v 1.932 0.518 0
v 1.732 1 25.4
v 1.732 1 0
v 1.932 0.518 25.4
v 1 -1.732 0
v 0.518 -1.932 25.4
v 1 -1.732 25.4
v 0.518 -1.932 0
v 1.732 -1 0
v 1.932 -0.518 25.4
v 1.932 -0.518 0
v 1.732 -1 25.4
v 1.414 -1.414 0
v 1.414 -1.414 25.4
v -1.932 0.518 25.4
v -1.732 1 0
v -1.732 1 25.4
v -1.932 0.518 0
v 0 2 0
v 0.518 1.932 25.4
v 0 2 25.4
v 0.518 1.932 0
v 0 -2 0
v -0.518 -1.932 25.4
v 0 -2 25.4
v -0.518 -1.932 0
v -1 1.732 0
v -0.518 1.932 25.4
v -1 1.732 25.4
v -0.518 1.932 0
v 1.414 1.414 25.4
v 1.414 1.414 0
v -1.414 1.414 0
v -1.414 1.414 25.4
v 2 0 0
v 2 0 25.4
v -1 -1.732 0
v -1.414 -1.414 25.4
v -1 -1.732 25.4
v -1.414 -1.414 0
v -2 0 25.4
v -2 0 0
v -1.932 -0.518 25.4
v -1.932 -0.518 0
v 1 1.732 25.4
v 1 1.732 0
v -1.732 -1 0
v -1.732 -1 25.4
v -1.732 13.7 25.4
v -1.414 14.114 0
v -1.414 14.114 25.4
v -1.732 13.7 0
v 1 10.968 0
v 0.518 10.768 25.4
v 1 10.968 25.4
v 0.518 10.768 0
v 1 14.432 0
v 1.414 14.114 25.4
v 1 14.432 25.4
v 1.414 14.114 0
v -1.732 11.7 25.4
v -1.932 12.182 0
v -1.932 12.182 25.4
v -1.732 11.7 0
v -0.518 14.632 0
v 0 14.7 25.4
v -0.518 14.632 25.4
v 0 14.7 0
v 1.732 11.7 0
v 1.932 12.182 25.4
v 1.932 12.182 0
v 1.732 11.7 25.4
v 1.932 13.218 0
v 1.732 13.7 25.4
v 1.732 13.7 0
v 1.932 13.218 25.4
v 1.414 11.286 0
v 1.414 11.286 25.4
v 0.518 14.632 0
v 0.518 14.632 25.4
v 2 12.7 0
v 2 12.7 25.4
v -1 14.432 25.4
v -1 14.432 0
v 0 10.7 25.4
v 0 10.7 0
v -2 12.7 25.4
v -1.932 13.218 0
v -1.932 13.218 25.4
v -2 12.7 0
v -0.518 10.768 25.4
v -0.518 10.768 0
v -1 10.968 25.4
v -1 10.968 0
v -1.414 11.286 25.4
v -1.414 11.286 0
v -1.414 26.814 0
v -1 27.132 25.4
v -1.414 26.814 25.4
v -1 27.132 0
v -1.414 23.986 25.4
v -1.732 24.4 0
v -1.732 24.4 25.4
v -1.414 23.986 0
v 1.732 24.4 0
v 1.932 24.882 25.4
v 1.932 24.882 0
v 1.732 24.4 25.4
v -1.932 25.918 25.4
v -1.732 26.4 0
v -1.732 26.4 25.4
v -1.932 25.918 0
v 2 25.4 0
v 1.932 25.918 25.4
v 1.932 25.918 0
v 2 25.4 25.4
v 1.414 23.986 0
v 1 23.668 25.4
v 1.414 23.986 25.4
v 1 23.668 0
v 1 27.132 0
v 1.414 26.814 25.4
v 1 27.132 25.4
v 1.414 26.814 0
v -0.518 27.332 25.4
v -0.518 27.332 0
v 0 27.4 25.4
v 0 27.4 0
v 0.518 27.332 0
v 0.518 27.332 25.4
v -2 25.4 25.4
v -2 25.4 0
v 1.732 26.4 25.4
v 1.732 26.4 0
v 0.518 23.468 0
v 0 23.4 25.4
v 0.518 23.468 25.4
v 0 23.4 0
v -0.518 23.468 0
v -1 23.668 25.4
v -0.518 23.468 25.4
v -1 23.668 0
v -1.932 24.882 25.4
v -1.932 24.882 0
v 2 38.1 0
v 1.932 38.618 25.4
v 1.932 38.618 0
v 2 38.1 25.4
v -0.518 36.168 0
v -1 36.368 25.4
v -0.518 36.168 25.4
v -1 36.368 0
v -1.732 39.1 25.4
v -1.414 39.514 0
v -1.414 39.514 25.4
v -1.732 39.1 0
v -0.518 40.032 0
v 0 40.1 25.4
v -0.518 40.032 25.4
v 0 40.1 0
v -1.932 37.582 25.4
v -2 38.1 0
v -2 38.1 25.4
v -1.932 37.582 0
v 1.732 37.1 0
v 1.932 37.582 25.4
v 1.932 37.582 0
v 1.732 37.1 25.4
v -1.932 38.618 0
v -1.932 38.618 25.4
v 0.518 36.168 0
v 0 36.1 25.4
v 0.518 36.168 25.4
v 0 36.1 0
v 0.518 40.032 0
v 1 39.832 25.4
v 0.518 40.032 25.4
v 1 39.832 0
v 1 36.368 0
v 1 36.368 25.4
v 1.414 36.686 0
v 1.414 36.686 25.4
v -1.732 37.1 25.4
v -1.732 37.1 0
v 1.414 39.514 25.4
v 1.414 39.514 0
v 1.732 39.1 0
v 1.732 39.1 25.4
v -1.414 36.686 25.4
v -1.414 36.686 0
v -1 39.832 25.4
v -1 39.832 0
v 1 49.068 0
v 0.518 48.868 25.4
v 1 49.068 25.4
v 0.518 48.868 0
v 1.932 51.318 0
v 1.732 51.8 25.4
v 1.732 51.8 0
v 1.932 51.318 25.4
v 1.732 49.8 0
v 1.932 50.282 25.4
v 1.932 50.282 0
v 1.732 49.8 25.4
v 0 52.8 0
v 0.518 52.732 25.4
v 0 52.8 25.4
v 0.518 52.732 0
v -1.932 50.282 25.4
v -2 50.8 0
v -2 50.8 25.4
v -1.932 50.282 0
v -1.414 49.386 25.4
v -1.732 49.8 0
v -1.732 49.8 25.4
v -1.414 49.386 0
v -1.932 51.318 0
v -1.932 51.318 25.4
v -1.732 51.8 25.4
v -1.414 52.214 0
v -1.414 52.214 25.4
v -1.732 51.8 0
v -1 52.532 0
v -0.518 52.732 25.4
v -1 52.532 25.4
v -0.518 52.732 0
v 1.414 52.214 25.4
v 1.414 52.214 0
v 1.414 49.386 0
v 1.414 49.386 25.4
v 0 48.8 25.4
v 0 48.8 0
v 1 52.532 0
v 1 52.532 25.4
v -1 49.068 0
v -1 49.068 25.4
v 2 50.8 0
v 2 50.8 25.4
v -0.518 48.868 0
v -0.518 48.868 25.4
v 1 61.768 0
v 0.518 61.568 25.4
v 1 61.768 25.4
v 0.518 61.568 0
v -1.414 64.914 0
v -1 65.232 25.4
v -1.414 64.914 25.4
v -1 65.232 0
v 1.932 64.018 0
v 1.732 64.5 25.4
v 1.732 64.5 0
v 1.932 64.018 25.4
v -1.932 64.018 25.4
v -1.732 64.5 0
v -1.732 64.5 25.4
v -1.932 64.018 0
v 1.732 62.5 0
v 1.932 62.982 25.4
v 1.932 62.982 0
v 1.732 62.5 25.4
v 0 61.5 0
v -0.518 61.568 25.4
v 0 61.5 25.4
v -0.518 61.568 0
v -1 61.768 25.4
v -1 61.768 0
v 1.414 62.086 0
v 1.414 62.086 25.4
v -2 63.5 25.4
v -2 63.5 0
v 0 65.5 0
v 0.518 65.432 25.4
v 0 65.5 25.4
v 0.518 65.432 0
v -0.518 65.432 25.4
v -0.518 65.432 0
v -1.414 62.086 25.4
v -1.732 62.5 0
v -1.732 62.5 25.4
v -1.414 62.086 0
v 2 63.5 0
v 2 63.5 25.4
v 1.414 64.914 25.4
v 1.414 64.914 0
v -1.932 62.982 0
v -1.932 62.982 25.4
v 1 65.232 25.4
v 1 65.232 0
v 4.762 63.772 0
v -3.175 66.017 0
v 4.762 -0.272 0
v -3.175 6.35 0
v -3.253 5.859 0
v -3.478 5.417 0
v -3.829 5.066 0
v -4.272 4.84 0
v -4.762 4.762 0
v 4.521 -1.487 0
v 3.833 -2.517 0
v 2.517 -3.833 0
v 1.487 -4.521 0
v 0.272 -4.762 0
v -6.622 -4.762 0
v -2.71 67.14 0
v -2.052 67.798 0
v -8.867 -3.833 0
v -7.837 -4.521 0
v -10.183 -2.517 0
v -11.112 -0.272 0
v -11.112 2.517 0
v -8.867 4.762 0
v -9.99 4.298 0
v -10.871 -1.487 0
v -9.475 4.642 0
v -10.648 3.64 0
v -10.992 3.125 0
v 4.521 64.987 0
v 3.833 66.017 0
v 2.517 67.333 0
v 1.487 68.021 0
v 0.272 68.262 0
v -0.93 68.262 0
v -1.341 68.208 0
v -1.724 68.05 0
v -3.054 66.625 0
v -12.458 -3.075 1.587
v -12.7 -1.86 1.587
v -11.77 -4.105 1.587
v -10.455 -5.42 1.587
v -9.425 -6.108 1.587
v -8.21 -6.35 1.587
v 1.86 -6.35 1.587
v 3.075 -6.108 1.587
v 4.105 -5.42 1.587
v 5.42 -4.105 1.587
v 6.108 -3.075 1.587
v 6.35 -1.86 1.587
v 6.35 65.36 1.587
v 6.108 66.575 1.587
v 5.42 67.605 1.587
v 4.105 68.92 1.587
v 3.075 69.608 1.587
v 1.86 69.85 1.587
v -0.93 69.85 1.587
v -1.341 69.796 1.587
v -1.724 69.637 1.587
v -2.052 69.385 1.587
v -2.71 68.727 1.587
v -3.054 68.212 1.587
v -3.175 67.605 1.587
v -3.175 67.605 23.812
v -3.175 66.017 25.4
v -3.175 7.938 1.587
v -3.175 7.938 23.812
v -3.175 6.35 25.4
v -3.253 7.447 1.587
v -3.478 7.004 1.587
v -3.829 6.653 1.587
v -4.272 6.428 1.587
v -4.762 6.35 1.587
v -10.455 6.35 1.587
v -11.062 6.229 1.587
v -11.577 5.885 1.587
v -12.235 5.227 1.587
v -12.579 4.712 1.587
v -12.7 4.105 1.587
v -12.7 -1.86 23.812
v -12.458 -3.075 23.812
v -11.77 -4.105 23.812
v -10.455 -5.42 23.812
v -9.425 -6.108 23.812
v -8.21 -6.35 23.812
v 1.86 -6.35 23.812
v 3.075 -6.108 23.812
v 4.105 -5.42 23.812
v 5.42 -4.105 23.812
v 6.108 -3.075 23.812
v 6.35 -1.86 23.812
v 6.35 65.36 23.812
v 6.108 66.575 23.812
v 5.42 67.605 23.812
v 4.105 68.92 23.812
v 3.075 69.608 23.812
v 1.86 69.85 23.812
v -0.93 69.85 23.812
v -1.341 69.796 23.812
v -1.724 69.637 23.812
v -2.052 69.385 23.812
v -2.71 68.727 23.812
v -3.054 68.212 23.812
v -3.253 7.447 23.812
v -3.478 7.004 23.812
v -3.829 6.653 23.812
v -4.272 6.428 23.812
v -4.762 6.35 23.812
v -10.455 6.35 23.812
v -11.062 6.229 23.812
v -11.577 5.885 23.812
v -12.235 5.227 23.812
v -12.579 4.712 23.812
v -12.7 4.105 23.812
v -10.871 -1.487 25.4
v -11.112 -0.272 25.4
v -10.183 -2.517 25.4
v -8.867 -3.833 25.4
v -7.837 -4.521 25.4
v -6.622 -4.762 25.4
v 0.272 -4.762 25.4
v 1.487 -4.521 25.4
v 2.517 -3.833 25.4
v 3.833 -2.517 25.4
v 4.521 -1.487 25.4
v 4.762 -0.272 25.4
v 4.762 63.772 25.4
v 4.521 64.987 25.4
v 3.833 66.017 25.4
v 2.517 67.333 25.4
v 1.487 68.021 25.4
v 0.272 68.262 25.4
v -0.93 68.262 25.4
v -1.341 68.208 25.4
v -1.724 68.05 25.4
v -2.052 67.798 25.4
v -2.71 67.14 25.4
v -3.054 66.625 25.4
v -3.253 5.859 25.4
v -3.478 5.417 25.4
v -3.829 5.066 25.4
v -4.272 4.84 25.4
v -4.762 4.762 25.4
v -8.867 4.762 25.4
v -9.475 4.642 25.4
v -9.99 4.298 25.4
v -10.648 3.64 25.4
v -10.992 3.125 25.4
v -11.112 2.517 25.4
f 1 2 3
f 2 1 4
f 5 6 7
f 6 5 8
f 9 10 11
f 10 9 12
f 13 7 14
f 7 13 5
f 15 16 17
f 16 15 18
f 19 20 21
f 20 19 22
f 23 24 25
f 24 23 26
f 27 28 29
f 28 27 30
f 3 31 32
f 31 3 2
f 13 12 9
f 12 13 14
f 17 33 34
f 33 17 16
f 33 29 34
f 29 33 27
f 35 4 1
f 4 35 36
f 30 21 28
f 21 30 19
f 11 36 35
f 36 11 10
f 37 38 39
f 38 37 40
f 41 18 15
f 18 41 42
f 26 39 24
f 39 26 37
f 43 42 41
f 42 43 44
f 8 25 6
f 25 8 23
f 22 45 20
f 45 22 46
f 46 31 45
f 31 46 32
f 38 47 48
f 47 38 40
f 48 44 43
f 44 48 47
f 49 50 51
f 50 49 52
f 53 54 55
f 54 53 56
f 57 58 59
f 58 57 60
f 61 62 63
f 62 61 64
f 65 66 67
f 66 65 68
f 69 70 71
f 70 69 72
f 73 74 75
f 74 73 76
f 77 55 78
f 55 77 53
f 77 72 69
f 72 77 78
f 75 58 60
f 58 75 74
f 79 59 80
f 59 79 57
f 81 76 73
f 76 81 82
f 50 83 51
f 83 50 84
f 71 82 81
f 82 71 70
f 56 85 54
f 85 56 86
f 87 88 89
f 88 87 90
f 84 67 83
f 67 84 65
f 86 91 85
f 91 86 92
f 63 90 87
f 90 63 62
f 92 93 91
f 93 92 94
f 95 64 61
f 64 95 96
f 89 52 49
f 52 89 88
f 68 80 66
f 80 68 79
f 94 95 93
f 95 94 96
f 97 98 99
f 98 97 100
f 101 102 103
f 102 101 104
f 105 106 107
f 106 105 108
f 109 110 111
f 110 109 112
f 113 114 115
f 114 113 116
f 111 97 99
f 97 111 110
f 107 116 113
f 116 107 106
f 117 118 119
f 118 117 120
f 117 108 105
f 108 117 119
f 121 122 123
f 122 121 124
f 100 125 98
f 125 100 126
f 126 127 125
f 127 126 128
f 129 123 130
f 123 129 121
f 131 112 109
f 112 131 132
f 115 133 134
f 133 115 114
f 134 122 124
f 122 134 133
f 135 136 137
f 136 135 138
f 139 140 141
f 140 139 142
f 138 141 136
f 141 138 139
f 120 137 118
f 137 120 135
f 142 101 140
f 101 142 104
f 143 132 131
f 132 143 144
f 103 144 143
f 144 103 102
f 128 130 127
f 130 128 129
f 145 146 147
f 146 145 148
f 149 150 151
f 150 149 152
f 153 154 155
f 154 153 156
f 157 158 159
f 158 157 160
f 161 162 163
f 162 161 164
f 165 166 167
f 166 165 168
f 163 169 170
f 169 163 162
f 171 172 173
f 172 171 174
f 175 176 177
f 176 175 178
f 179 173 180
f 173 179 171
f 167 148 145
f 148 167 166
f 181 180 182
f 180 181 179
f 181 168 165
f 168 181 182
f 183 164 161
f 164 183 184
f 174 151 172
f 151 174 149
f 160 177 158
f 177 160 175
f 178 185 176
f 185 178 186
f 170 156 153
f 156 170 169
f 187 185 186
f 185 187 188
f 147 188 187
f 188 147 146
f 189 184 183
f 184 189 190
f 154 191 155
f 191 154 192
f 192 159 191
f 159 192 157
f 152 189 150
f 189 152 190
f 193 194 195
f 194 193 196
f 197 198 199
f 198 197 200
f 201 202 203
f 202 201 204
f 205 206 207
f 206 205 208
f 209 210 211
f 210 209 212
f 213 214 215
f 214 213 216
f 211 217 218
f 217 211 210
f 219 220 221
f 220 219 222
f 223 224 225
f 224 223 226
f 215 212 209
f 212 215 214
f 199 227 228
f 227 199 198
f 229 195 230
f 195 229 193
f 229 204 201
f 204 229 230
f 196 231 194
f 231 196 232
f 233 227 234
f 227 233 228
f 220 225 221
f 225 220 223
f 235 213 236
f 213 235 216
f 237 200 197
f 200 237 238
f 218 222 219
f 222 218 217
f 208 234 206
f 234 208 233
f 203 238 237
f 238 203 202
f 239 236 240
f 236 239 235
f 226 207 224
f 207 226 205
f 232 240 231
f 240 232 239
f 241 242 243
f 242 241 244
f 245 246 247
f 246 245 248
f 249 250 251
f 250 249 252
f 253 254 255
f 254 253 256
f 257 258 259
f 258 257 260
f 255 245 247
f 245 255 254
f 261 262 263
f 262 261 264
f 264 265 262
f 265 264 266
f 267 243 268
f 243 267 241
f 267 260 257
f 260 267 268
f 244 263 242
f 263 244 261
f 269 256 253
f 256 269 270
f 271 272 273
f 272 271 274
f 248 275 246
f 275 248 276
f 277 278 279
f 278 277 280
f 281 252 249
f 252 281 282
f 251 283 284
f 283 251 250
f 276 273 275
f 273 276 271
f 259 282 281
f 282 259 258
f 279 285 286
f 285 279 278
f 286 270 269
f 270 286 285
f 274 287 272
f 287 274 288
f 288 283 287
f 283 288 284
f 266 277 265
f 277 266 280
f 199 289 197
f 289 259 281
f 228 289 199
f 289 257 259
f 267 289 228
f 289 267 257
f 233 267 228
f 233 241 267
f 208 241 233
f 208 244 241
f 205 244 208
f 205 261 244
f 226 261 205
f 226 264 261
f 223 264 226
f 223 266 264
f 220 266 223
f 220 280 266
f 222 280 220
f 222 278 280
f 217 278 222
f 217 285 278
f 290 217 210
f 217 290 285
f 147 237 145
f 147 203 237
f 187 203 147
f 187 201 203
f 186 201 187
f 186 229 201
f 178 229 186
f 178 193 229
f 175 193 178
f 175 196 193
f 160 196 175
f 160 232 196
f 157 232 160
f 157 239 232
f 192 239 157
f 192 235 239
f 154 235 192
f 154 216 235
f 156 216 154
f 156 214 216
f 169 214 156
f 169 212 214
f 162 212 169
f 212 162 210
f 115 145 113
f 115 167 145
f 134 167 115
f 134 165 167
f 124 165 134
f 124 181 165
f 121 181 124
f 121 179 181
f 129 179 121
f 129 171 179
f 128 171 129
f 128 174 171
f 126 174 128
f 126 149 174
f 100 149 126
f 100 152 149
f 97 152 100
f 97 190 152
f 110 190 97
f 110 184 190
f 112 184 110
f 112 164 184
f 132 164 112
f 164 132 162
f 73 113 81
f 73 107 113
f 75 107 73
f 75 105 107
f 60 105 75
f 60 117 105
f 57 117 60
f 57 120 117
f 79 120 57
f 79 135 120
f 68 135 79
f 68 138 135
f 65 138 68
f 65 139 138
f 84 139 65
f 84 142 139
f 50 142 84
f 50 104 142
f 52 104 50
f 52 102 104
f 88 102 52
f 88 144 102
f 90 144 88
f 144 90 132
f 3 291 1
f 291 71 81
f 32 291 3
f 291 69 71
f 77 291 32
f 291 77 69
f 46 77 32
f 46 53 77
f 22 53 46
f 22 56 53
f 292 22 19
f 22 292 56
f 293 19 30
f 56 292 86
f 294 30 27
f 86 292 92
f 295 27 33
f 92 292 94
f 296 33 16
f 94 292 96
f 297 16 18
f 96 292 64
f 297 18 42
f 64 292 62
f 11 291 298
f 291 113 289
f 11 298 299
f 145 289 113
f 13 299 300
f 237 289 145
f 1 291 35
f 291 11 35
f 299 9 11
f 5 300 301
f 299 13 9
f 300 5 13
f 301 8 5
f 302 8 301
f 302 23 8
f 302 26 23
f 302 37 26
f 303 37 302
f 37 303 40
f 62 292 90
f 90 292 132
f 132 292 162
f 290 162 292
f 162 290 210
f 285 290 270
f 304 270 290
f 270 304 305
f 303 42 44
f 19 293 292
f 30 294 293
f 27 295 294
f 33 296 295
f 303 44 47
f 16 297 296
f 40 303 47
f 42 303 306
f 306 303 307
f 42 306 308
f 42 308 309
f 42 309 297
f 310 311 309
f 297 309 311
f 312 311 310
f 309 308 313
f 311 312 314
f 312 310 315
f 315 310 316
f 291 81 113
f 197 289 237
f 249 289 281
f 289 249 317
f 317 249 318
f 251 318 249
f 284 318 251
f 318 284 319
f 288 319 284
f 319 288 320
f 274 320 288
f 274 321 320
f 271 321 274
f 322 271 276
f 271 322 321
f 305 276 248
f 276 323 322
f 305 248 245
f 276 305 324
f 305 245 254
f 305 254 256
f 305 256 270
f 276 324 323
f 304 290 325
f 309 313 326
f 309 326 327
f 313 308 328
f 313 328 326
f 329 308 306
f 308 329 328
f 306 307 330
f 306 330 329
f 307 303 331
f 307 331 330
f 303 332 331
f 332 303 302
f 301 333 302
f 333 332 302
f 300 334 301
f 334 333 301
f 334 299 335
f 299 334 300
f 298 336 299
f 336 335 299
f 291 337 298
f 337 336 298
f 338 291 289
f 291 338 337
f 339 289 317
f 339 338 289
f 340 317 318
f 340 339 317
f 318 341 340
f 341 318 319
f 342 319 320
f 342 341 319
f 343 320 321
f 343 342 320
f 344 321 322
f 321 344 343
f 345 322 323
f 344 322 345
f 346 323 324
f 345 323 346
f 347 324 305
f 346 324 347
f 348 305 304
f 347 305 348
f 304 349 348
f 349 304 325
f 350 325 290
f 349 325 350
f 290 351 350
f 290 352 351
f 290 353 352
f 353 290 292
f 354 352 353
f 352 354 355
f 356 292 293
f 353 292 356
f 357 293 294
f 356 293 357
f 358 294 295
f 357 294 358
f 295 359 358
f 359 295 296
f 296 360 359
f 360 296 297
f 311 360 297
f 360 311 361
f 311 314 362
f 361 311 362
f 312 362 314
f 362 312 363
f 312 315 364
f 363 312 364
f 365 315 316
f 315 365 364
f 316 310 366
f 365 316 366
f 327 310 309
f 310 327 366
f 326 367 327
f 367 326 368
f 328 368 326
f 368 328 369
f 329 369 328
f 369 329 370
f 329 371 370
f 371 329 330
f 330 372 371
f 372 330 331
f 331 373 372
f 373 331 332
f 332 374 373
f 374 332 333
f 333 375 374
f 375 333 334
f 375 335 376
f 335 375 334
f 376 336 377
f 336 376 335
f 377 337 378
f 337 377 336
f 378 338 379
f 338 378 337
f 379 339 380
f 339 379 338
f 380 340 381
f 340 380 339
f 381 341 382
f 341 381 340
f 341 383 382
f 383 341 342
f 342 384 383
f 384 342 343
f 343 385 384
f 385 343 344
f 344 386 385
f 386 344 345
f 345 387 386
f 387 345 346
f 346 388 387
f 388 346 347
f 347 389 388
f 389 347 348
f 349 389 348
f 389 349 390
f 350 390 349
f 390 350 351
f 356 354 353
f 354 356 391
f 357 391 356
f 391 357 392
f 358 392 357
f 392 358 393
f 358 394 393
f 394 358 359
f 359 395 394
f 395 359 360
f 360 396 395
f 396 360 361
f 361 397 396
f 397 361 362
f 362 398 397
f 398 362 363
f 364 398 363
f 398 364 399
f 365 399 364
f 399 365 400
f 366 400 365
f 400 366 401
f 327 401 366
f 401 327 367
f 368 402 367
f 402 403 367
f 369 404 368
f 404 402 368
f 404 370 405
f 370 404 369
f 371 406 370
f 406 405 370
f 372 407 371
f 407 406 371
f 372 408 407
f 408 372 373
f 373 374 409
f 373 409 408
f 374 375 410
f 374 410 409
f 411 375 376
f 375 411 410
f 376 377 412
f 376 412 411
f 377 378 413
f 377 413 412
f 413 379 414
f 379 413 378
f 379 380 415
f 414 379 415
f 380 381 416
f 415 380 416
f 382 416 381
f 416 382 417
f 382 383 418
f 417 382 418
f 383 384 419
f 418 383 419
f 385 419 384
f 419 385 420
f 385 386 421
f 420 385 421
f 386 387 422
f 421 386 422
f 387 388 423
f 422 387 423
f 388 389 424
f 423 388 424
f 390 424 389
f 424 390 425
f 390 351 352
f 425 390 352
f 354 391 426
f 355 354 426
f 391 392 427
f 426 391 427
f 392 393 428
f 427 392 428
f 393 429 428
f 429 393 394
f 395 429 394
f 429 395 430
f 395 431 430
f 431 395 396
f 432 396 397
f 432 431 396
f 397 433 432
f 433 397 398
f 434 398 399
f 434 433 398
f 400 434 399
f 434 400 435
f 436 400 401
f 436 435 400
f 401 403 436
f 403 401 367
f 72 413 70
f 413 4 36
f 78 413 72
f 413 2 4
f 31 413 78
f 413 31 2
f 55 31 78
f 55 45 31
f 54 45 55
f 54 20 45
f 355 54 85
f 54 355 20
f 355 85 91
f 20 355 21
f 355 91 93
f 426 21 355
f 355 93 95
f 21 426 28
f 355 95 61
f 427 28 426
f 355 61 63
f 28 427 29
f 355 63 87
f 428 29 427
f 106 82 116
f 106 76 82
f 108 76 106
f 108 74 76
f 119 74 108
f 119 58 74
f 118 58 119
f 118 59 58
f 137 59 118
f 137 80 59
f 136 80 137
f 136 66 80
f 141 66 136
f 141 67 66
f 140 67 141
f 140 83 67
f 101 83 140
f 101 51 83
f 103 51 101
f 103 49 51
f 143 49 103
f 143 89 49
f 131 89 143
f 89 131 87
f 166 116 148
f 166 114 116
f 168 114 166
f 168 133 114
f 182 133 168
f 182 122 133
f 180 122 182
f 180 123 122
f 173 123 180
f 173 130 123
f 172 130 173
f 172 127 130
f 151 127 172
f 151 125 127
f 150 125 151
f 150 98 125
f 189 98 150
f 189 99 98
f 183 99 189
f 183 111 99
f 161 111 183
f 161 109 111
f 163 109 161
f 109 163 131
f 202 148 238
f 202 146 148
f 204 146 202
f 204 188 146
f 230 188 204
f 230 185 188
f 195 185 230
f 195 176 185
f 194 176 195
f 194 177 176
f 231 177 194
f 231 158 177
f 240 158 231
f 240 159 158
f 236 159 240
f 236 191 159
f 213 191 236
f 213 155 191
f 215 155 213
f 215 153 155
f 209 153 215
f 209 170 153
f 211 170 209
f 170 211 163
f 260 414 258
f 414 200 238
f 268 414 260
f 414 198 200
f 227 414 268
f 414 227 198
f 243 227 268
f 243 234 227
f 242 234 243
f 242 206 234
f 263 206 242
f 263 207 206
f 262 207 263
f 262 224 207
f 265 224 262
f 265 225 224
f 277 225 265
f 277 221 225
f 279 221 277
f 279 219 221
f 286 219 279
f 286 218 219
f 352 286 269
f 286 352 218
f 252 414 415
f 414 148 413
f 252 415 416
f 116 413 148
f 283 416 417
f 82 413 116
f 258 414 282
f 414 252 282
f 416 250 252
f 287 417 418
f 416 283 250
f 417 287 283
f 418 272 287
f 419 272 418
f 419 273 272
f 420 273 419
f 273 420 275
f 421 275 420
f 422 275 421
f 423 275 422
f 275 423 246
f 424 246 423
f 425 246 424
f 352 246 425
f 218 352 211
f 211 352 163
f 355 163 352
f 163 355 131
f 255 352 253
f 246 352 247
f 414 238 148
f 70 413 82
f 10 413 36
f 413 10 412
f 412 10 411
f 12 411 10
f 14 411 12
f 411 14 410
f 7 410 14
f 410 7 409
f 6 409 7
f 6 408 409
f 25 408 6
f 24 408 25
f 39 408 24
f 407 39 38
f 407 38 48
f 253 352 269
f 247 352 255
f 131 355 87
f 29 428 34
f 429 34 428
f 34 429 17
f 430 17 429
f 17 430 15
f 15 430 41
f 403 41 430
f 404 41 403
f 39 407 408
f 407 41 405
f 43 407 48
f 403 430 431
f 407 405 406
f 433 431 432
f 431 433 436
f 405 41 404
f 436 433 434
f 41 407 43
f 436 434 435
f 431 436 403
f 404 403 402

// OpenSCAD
// file: ../lib/TOGComplexLib1.scad
function tcplx1_multiply(a, b) =
	[a[0]*b[0] - a[1]*b[1], a[0]*b[1] + a[1]*b[0]];
function tcplx1_divide(a, b) =
	let(bot = (b[0]*b[0] + b[1]*b[1]))
	[
		(a[0]*b[0] + a[1]*b[1])/bot,
		(a[1]*b[0] - a[0]*b[1])/bot
	];

assert([-11,23] == tcplx1_multiply([3,2], [1,7]));

assert([-1,3] == tcplx1_multiply([3,1], [0,1]));
assert([-1,3] == tcplx1_multiply([0,1], [3,1]));

echo(tcplx1_divide([-1,3], [3,1]));
assert([0,1] == tcplx1_divide([-1,3], [3,1]));

function tcplx1_normalize(vec) =
	let(veclen = sqrt(vec[0]*vec[0]+vec[1]*vec[1]))
	[vec[0] / veclen, vec[1] / veclen];

function tcplx1_relative_turnvec_vv(v0, v1) =
	tcplx1_divide(tcplx1_normalize(v1), tcplx1_normalize(v0));

function tcplx1_relative_turnvec_abc(p0, p1, p2) = tcplx1_relative_turnvec_vv(p1-p0, p2-p1);

// A 90-degree turn
assert([0,1] == tcplx1_relative_turnvec_abc([0,0], [1,0], [1,1]));
assert([0,1] == tcplx1_relative_turnvec_abc([0,0], [0,1], [-1,1]));

// A 45-degree turn
assert(tcplx1_normalize([1,1]) == tcplx1_relative_turnvec_abc([0,0], [1,0], [ 2,1]));
assert(tcplx1_normalize([1,1]) == tcplx1_relative_turnvec_abc([0,0], [0,1], [-1,2]));


function tcplx1_relative_angle_abc(p0, p1, p2) =
	let(turnvec = tcplx1_relative_turnvec_abc(p0, p1, p2))
	atan2(turnvec[1], turnvec[0]);

assert(-135 == tcplx1_relative_angle_abc([0,0], [1,0], [0,-1]));
assert( -90 == tcplx1_relative_angle_abc([0,0], [1,0], [1,-1]));
assert(   0 == tcplx1_relative_angle_abc([0,0], [1,0], [2, 0]));
assert(  90 == tcplx1_relative_angle_abc([0,0], [1,0], [1, 1]));
assert( 135 == tcplx1_relative_angle_abc([0,0], [1,0], [0, 1]));

assert(  90 == tcplx1_relative_angle_abc([1,1], [3,3], [1, 5]));
// file: ../lib/TOGArrayLib1.scad
// TOGArrayLib1.5
// 
// Functions for working with arrays.
// 
// v1.1:
// - tal1_reduce assert(is_list(items)) to prevent infinite recursion
//   when given undefined or other non-list values
// v1.1.1:
// - Fix tal1_uniq_remap_v2 to return "list-remap-result" as the
//   first element of the returned list
// v1.2:
// - Add tal1_replace_at function
// v1.3:
// - tal1_is_vec_of, tal1_is_vec_of_num
// v1.4:
// - tal1_assert_for_each, for when you want to assert something
//   about each of a list of items and get nice failure messages
// v1.5:
// - Add tal1_duplicate_reversed function, which may be
//   handy when generating symmetrical polygons and stuff.

/**
 * Make a list with the contents of list `a`,
 * but starting at offset `off`, replaced by the contents of list `b`.
 * len(result) = max(len(a), off+len(b))
 */
function tal1_replace_at(a, off, b, default_value=undef, default_value_function=undef) =
	assert(is_list(a))
	assert(is_list(b))
	let( _dvf = !is_undef(default_value_function) ? default_value_function : function(i) default_value )
[
	for( i=[0:1:min(off,len(a))-1] ) a[i],
	for( i=[len(a):1:off-1] ) _dvf(i),
	for( i=[off:1:off+len(b)-1] ) b[i-off],
	for( i=[off+len(b):1:len(a)-1] ) a[i],
];

// Simplest case
assert([] == tal1_replace_at([], 0, []));
// Second simplest cases
assert(["foo"] == tal1_replace_at(["foo"], 0, []));
assert(["foo"] == tal1_replace_at([], 0, ["foo"]));
// Replace one item
assert(["foo","quux","baz"] == tal1_replace_at(["foo","bar","baz"], 1, ["quux"]));
// Replace and extend
assert(["foo","quux","tuna","tina"] == tal1_replace_at(["foo","bar","baz"], 1, ["quux", "tuna", "tina"]));
// Add beyond end of `a`
assert(["foo","zzz","quux"] == tal1_replace_at(["foo"], 2, ["quux"], default_value="zzz"));
// Adding 'nothing' should still fill to that point with defaults
assert(["foo","zzz","zzz"] == tal1_replace_at(["foo"], 3, [], default_value="zzz"));


function tal1_reduce(start, items, func, offset=0) =
	assert(is_list(items))
	len(items) == offset ? start :
	tal1_reduce(func(start, items[offset]), items, func, offset+1);

function tal1_consecutive_duplicate_count(items) = tal1_reduce(
	[0, undef],
	items,
	function(z,item) [z[0] + (item == z[1] ? 1 : 0), item]
)[0];

assert(0 == tal1_consecutive_duplicate_count([]));
assert(0 == tal1_consecutive_duplicate_count([50]));
assert(1 == tal1_consecutive_duplicate_count([50,50]));
assert(0 == tal1_consecutive_duplicate_count([50,51,52,53]));
assert(1 == tal1_consecutive_duplicate_count([50,51,52,52]));
assert(3 == tal1_consecutive_duplicate_count([50,50,50,50]));

// Set test_size to arbirarily large values
// to ensure that OpenSCAD can handle heavy recursion
let(test_size=1000) assert(test_size/2 == tal1_consecutive_duplicate_count([for(i=[0:1:test_size-1]) floor(i/2)]));



function tal1_uniq_(items, off0, off1) =
	let(chunklen = off1-off0)
	chunklen == 0 ? [] :
	chunklen == 1 ? [items[off0]] :
	let(half=floor(chunklen/2))
	let(left  = tal1_uniq_(items, off0     , off0+half))
	let(right = tal1_uniq_(items, off0+half, off1     ))
	assert(len(left) > 0)
	assert(len(right) > 0)
	left[len(left)-1] == right[0] ? [each left, for(i=[1:1:len(right)-1]) right[i]] :
	[each left, each right];

/** Given a list of items, returns a new list with identical consecutive items merged */
function tal1_uniq(items) = tal1_uniq_(items, 0, len(items));

assert([] == tal1_uniq([]));
assert([123] == tal1_uniq([123]));
assert([55,0,1,2,3] == tal1_uniq([55,0,1,2,3]));
assert([55,0,1,2] == tal1_uniq([55,0,1,1,2]));
assert([55,0,1] == tal1_uniq([55,55,0,0,0,0,0,0,1,1,1,1]));
assert([55,0] == tal1_uniq([55,0,0,0,0,0,0,0]));



/**
 * Returns [new items, old index -> new index mapping].
 * No-op version.
 */
function tal1_uniq_remap_v1(items) =
	["list-remap-result", items, [for (vi=[0:1:len(items)-1]) vi]];

// [a, a, b, b, c, c]
//
// [a,    ...], []  -> [a],[0]
// [a, a, ...], [0] -> [a],[0,0]

assert([1,2,3] == [1,2,3]);

/**
 * Recursive version that will combine adjacent identical vertexes,
 * but will use the original items.
 */
function tal1_uniq_remap_v2(items, map=[]) =
	let(index = len(map))
	len(items) == index ? ["list-remap-result", items, map] :
	index == 0 ? tal1_uniq_remap_v2(items, [0]) :
	items[index] == items[map[index-1]] ? tal1_uniq_remap_v2(items, [for(vi=map) vi, map[index-1]]) :
	tal1_uniq_remap_v2(items, [for(vi=map) vi, index]);

assert(tal1_uniq_remap_v2([1,1,2,2,3,4]) == ["list-remap-result", [1,1,2,2,3,4], [0,0,2,2,4,5]]);


/**
 * Returns true if `vec` is a list of at least min_len items
 * and component_check(each item, even those beyond min_len) is true.
 */
function tal1_is_vec_of(vec, min_len=0, component_check=function(x) true) =
	assert(is_num(min_len) && min_len >= 0)
	assert(is_function(component_check))
	is_list(vec) && len(vec) >= min_len &&
	tal1_reduce(true, vec, function(prev,item) prev && component_check(item));

function tal1_is_vec_of_num(vec, min_len=0) = tal1_is_vec_of(vec, min_len, function(i) is_num(i));

assert( true == tal1_is_vec_of_num([1,2,3]));
assert( true == tal1_is_vec_of_num([]));
assert( true == tal1_is_vec_of_num([1,2,3], 3));
assert(false == tal1_is_vec_of_num([1,2], 3));
assert(false == tal1_is_vec_of_num([1,2,"spoon"], 3));
// Requirements are ambiguous when
// first min_len items are numbers, but there are non-numeric items afterwards,
// so let's error on the side of saying 'no, it's not a list of numbers';
// i.e. the item check and the min_len are independent.
assert(false == tal1_is_vec_of_num([1,2,3,"artichoke"], 3));


/**
 * Asserts that item_checker(each item in list, index of item)[0] is true.
 * Second element of item_checker return value is assertion message.
 * Returns the original list, in case that's useful to you.
 */
function tal1_assert_for_each(list, item_checker) =
	let( _ignored = [ for(i=[0:1:len(list)-1])
		let(q=item_checker(list[i],i))
		let(passed=is_bool(q) ? q : is_list(q) ? q[0] : assert(false, str(
			"tal1_assert_for_each: item_checker should return Bool|[Bool,String], but returned ",
			q, " for item at index ", i)))
		let(message=is_list(q) ? q[1] : undef)
		assert(passed, message)
		q
	])
	list;

// Callback can return a boolean...
assert([1,2,3] == tal1_assert_for_each([1,2,3], function(v,i) is_num(v)));
// ...or a [boolean, string]
assert([1,2,3] == tal1_assert_for_each([1,2,3], function(v,i) [is_num(v), "element be a num"]));

// [a, b, c] -> [a, b, c, rxf(c), rxf(b), rxf(a)]
function tal1_duplicate_reversed(list, rxf=function(item) item) =
	[
		each list,
		for( i=[len(list)-1 : -1 : 0] ) rxf(list[i]),
	];
// file: ../lib/TOGMod1Constructors.scad
// TOGMod1Constructors-v1.11
// 
// Functions to construct objects understood by TOGMod1
// 
// v1.1:
// - Add togmod1_make_rounded_rect
// v1.2:
// - togmod1_make_rounded_rect can make ovals
// v1.3:
// - togmod1_circle_points, to just get the points of a circle
// - if pos parameter to circle function has a third element,
//   returned vertexes will include it as the z component;
// v1.3.1
// - Some assertions
// v1.4:
// - Refactor togmod1_rounded_rect_points and togmod1_circle_points
//   to use togmod1__make_nd_vector_adder for adapting to whatever
//   `pos` parameter is.
// v1.5:
// - togmod_rounded_rect_points will not simplify completely rounded sides
//   (where length of side is exactly twice the rounding radius)
//   unless simplify_rounded_sides=true
//   - This makes it more useful for polyhedron generation,
//     where radius varies, but number of points must remain constant.
// v1.6:
// - togmod1_make_rect makes a simple rectangle
// - togmod1_make_rounded_rect will defer to togmod1_make_rect when r=0
// v1.7:
// - togmod1_make_circle will return empty shape (["union"]) when d=0
// v1.8:
// - Add togmod1_text
// v1.9:
// - togmod1_circle_points uses 3 as minimum circle point count instead of 6
// v1.10:
// - Fix togmod1_linear_extrude_y so that range corresponds to Y start/end and
//   polygon X,Y correspond to X,Z.  Previously it was rotated wrongly,
//   which would have gone unnoticed for symmetrical shapes centered at 0,0.
// v1.11:
// - Remove an 'echo'

use <./TOGArrayLib1.scad>

function togmod1__make_nd_vector_adder(origin=[0,0]) =
	let(origin_is_zero = tal1_reduce(true, origin, function(prev,item) prev && item == 0))
	origin_is_zero ? (function(vec) len(vec) >= len(origin) ? vec : tal1_replace_at(origin, 0, vec)) :
	function(vec) [
		for(i=[0:1:max(len(origin),len(vec))-1]) (len(vec) > i ? vec[i] : 0) + (len(origin) > i ? origin[i] : 0),
	];

assert([1,2,3] == togmod1__make_nd_vector_adder()([1,2,3]));
assert([1,2,3] == togmod1__make_nd_vector_adder([0,0,3])([1,2]));


function togmod1_make_cuboid(size) =
	assert(is_list(size))
	assert(len(size) >= 3)
	assert(is_num(size[0]))
	assert(is_num(size[1]))
	assert(is_num(size[2]))
	["polyhedron-vf", [
		[-size[0]/2, -size[1]/2, -size[2]/2],
		[+size[0]/2, -size[1]/2, -size[2]/2],
		[-size[0]/2, +size[1]/2, -size[2]/2],
		[+size[0]/2, +size[1]/2, -size[2]/2],
		[-size[0]/2, -size[1]/2, +size[2]/2],
		[+size[0]/2, -size[1]/2, +size[2]/2],
		[-size[0]/2, +size[1]/2, +size[2]/2],
		[+size[0]/2, +size[1]/2, +size[2]/2]
	], [
		[0,1,3,2],[0,4,5,1],[4,6,7,5],[3,7,6,2],[1,5,7,3],[6,4,0,2]
	]];

function togmod1_make_polygon(verts) =
	["polygon-vp", verts, [[for( i=[0:1:len(verts)-1] ) i%len(verts)]]];

function togmod1_rounded_rect_points(size, r, pos=[0,0], simplify_rounded_sides=false) =
	assert(is_list(size))
	assert(len(size) >= 2)
	let(radii = is_list(r) ? r : is_num(r) ? [r,r] : assert(false, "rounded_rect r(adius) should be list<num> or num"))
	let(rx = radii[0])
	let(ry = radii[1])
	assert(is_num(rx))
	assert(is_num(ry))
	assert(size[0] >= 2*rx, str("size[0] must be >= 2*r[0]; size[0] = ",size[0],", 2*r[0] = ",2*rx))
	assert(size[1] >= 2*ry, str("size[1] must be >= 2*r[1]; size[1] = ",size[1],", 2*r[1] = ",2*ry))
	let(quarterfn=max($fn/4, 1))
	let(qfnx = simplify_rounded_sides && size[0] == 2*rx ? quarterfn-1 : quarterfn)
	let(qfny = simplify_rounded_sides && size[1] == 2*ry ? quarterfn-1 : quarterfn)
	let(finalizepos = togmod1__make_nd_vector_adder(pos))
[
	for(a=[0 : 1 : qfnx]) let(ang=      a*90/quarterfn) finalizepos([ size[0]/2-rx + rx*cos(ang),  size[1]/2-ry + ry*sin(ang)]),
	for(a=[0 : 1 : qfny]) let(ang= 90 + a*90/quarterfn) finalizepos([-size[0]/2+rx + rx*cos(ang),  size[1]/2-ry + ry*sin(ang)]),
	for(a=[0 : 1 : qfnx]) let(ang=180 + a*90/quarterfn) finalizepos([-size[0]/2+rx + rx*cos(ang), -size[1]/2+ry + ry*sin(ang)]),
	for(a=[0 : 1 : qfny]) let(ang=270 + a*90/quarterfn) finalizepos([ size[0]/2-rx + rx*cos(ang), -size[1]/2+ry + ry*sin(ang)]),
];

function togmod1_make_rect(size) =
	togmod1_make_polygon([
		[-size[0]/2, -size[1]/2],
		[+size[0]/2, -size[1]/2],
		[+size[0]/2, +size[1]/2],
		[-size[0]/2, +size[1]/2],
	]);

function togmod1_make_rounded_rect(size, r) =
	r == 0 ? togmod1_make_rect(size) :
	togmod1_make_polygon(togmod1_rounded_rect_points(size,r,simplify_rounded_sides=true));

/**
 * Returns points for an approximation of a circle where points are at distance r from pos.
 * Can be used to make other regular polygons, but the faces will be less than that
 * distance from pos (do some trig if you want face distance, e.g. for a hex nut).
 */
function togmod1_circle_points(r, pos=[0,0], d=undef) =
	assert( !is_undef(r) || !is_undef(d) )
	assert(!is_undef(pos[0]))
	assert(!is_undef(pos[1]))
	let(finalizepos = togmod1__make_nd_vector_adder(pos))
	let(r_ = !is_undef(r) ? r : d/2)
	let(fn = max($fn, 3))
	[for(i=[0 : 1 : fn-1]) finalizepos([r_*cos(i*360/fn), r_*sin(i*360/fn)])];

function togmod1_make_circle(r, pos=[0,0], d=undef) =
	r == 0 || d == 0 ? ["union"] :
	togmod1_make_polygon(togmod1_circle_points(r=r, pos=pos, d=d));

function togmod1_make_cylinder(d, zrange=[0,1], r=undef, pos=[0,0]) =
	assert( !is_undef(r) || !is_undef(d) )
	let( r_ = !is_undef(r) ? r : d/2 )
	// TODO: Make polyhedron directly
	["linear-extrude-zs", zrange, togmod1_make_circle(r=r_, pos=pos)];

function togmod1__is_range1d(range) = is_list(range) && len(range) == 2 && is_num(range[0]) && is_num(range[1]);

function togmod1_linear_extrude_z(range, shape) =
	assert(togmod1__is_range1d(range))
	["linear-extrude-zs", range, shape];
function togmod1_linear_extrude_x(range, shape) =
	assert(togmod1__is_range1d(range))
	["rotate", [90, 0, 90], togmod1_linear_extrude_z(range, shape)];
function togmod1_linear_extrude_y(range, shape) =
	assert(togmod1__is_range1d(range))
	["rotate", [90, 0,  0], togmod1_linear_extrude_z([-range[1], -range[0]], shape)];

function togmod1_text(text, size, font, halign, valign, spacing, direction, language, script) =
	["text-tsfhvsdls", text, size, font, halign, valign, spacing, direction, language, script];
// file: ../lib/TOGMod1.scad
// TOGMod1.9
// OpenSCAD library for representing shapes
// 
// See also: Functional OpenSCAD (https://github.com/thehans/FunctionalOpenSCAD)
// 
// v1.8:
// - Add `text-tsfhvsdls`
// v1.9
// - Add `offset-ds` (offset with _d_elta a _s_hape)

module togmod1_domodule(mod) {
	assert(is_list(mod));
	assert(len(mod) > 0);
	if( mod[0] == "polygon-vp" ) {
		// ["polygon-vp", vertexes, paths]
		polygon(points=mod[1], paths=mod[2]);
	} else if( mod[0] == "polyhedron-vf" ) {
		polyhedron(mod[1], faces=mod[2]);
	} else if( mod[0] == "scale" ) {
		assert(len(mod) == 3);
		scale(mod[1]) togmod1_domodule(mod[2]);
	} else if( mod[0] == "translate" ) {
		assert(len(mod) == 3);
		assert(is_list(mod[1]));
		for(c=mod[1]) assert(is_num(c), "translate component should be numeric");
		translate(mod[1]) togmod1_domodule(mod[2]);
	} else if( mod[0] == "rotate" ) {
		assert(len(mod) == 3);
		rotate(mod[1]) togmod1_domodule(mod[2]);
	} else if( mod[0] == "intersection" ) {
		intersection_for( i=[1:1:len(mod)-1] ) togmod1_domodule(mod[i]);
	} else if( mod[0] == "difference" ) {
		difference() {
			togmod1_domodule(mod[1]);
			for( i=[2:1:len(mod)-1] ) togmod1_domodule(mod[i]);
		}
	} else if( mod[0] == "union" ) {
		for( i=[1:1:len(mod)-1] ) togmod1_domodule(mod[i]);
	} else if( mod[0] == "hull" ) {
		hull() for( i=[1:1:len(mod)-1] ) togmod1_domodule(mod[i]);
	} else if( mod[0] == "offset-rs" ) {
		assert(len(mod) == 3);
		assert(is_num(mod[1]));
		assert(is_list(mod[2]));
		offset(mod[1]) togmod1_domodule(mod[2]);
	} else if( mod[0] == "linear-extrude-zs" ) {
		// ["linear-extrude-zs", [z0,z1], 2d_shape] // centered
		// ["linear-extrude-zs", height, 2d_shape]
		let( zrange = is_list(mod[1]) ? mod[1] : [-mod[1]/2, mod[1]/2] ) {
			translate([0,0,zrange[0]]) linear_extrude(zrange[1]-zrange[0]) togmod1_domodule(mod[2]);
		}
	} else if( mod[0] == "render" ) {
		render() togmod1_domodule(mod[1]);
	} else if( mod[0] == "minkowski" ) {
		minkowski() {
			togmod1_domodule(mod[1]);
			togmod1_domodule(mod[2]);
		}
	} else if( mod[0] == "x-debug" ) {
		# togmod1_domodule(mod[1]);
	} else if( mod[0] == "x-color" ) {
		color(mod[1]) togmod1_domodule(mod[2]);
	} else if( mod[0] == "text-tsfhvsdls" ) {
		text(text=mod[1], size=mod[2], font=mod[3], halign=mod[4], valign=mod[5], spacing=mod[6], direction=mod[7], language=mod[7], script=mod[8]);
	} else if( mod[0] == "offset-ds" ) {
		assert(is_num(mod[1]));
		assert(is_list(mod[2]));
		offset(delta=mod[1]) togmod1_domodule(mod[2]);
	} else {
		assert(false, str("Unrecognized shape: ", mod[0]));
	}
}
// main file
height = 25.4;
z_bevel_size = 1.5875; // 0.001
hole_diameter = 4;

block_shape = "stubby-l-6"; // ["stubby-l-6", "straight-3"]

use <../lib/TOGMod1.scad>
use <../lib/TOGMod1Constructors.scad>
use <../lib/TOGPolyhedronLib1.scad>
use <../lib/TOGPath1.scad>

module __end_params() { }

// MidblockSpec = ["midblock-sh", ShapeSpec, HolePositions]
// ShapeSpec = ["shapespec", [[x,y], xy_bevel_factor, z_bevel_offset_vector]]
// - z_bevel_offset_vector is the vector by the opposite of which the corner
//   should be offset for bevels (or roundings) along the top and bottom edges
// HolePositions = [[x,y], ...]

inch = 25.4;
u = inch / 16;

l_midblock_spec = ["midblock-sh", [
	"shapespec",
	[[-8, - 4], 2, [-1,-1]],
	[[ 4, - 4], 2, [ 1,-1]],
	[[ 4,  44], 2, [ 1, 1]],
	[[-2,  44], 1, [ 0, 1]],
	[[-2,   4], 0, [ 0, 1]],
	[[-8,   4], 1, [-1, 1]],
], [
	[ 0,0],
	[ 0,8],
	[ 0,16],
	[ 0,24],
	[ 0,32],
	[ 0,40],
]];
straight3_midblock_spec = ["midblock-sh", [
	"shapespec",
	[[-4, - 4], 2, [-1,-1]],
	[[ 4, - 4], 2, [ 1,-1]],
	[[ 4,  20], 2, [ 1, 1]],
	[[-4,  20], 2, [-1, 1]],
], [
	[ 0,0],
	[ 0,8],
	[ 0,16],
]];

function shapespec_to_rath(shapespec, xy_bevel_size, z_bevel_offset) =
assert(shapespec[0] == "shapespec")
["togpath1-rath",
	for( i=[1:1:len(shapespec)-1] ) let( cs=shapespec[i] )
	let( cpos=cs[0] ) let( cbev=cs[1] ) let( czbevoff=cs[2] )
	let( ops = cs[1] == 0 ? [["round", xy_bevel_size]] : [["bevel", cbev*xy_bevel_size], ["round", cbev*xy_bevel_size]] )
	["togpath1-rathnode", cpos*u + czbevoff*z_bevel_offset, each ops]
];

function blockspec_to_tmod(blockspec) =
	let( block_hull = tphl1_make_polyhedron_from_layer_function(
		[[0, -z_bevel_size], [z_bevel_size,0], [height-z_bevel_size,0], [height,-z_bevel_size]],
		function(zo)
			let( rath = shapespec_to_rath(blockspec[1], 1*u, zo[1]) )
			[
				for(p=togpath1_rath_to_points(rath)) [p[0], p[1], zo[0]]
			])
	)
	let( hole = tphl1_make_z_cylinder(hole_diameter, [-1,height+1]) )
	["difference",
		block_hull,
		for( hp=blockspec[2] ) ["translate", hp*u, hole]
	];

$fn = 24;

spec =
	block_shape == "stubby-l-6" ? l_midblock_spec :
	block_shape == "straight-3" ? straight3_midblock_spec :
	assert(false, str("Unknown block style: '", block_shape, "'"));

togmod1_domodule(blockspec_to_tmod(spec));
